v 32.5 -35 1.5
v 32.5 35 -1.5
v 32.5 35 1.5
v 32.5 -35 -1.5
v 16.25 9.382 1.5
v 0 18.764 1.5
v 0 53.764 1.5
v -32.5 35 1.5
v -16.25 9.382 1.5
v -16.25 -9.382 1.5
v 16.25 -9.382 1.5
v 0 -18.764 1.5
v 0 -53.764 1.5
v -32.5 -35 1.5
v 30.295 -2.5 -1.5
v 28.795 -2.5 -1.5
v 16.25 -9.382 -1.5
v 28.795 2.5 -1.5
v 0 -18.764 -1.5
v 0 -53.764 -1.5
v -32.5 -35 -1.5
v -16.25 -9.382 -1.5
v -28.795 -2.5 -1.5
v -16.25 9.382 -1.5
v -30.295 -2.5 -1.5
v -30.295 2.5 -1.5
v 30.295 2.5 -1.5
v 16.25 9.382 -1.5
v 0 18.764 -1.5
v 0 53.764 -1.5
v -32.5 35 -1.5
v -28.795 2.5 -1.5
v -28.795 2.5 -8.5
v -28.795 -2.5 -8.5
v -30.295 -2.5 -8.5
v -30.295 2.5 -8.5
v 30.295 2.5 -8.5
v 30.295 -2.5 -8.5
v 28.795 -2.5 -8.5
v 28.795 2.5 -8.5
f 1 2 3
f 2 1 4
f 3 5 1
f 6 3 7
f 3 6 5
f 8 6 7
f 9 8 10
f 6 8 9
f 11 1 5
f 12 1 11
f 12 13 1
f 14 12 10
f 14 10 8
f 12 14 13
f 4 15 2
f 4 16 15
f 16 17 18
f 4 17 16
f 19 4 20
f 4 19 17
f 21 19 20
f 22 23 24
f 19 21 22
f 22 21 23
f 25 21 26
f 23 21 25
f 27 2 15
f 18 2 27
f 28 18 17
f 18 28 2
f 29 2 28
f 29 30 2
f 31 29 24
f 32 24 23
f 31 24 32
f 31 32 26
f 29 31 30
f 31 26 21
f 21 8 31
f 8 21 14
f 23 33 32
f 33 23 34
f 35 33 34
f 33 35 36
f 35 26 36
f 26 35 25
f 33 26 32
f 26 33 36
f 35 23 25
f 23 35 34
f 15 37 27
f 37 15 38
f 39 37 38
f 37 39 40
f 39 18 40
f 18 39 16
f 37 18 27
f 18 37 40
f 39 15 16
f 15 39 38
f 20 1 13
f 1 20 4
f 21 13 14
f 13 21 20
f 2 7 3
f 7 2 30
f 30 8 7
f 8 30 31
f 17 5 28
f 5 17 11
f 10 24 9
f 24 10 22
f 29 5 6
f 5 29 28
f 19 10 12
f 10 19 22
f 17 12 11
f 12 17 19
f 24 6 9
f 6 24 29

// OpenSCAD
$fn = 100;

// Functions for calculating the half-hexagons
function edge_length(width) = (width/2) / cos(30); // CAH
function point_height(width) = (width/2) * tan(30); // TOA
function leg(width) = edge_length(width) * sqrt(1/2);
function x_offset(width) = (width/2) - leg(width) * cos(15);
function y_offset(width, length) = length/2 - (leg(width) * sin(15));

// Core size variables
scaling = 1;
lip = 0;
h = (35 + lip) * scaling;
w = 65 * scaling;
l = 70 * scaling;

// Values for interior space
h_pad = -1;
w_pad = 5;
l_pad = 5;


// The lid
h_lid = 3;
function hex_len(width) = 2 * (cos(30) * width);
hex_edge = edge_length(w/2);

translate([0,0,0]){
difference(){
union(){
cube([w, l, h_lid], center=true); // Center Cube
translate([-w/2.2,0,-h_lid*1.5]){cube([1.5, 5, 8], center=true);} // The teeth
translate([w/2.2,0,-h_lid*1.5]){cube([1.5, 5, 8], center=true);}
translate([x_offset(w),-y_offset(w,l),0]){
	rotate([0,0,30]) cube([edge_length(w),edge_length(w),h_lid], center=true);
}
translate([-x_offset(w),-y_offset(w,l),0]){
	rotate([0,0,-30]) cube([edge_length(w),edge_length(w),h_lid], center=true);
}

translate([x_offset(w),y_offset(w,l),0]){
	rotate([0,0,-30]) cube([edge_length(w),edge_length(w),h_lid], center=true);
}
translate([-x_offset(w),y_offset(w,l),0]){
	rotate([0,0,30]) cube([edge_length(w),edge_length(w),h_lid], center=true);
}}

// The cutout
translate([0,0,0]){
union(){
	rotate([0,0,0]) cube([hex_len(hex_edge),hex_edge,h_lid], center=true);
	rotate([0,0,60]) cube([hex_len(hex_edge),hex_edge,h_lid], center=true);
	rotate([0,0,120]) cube([hex_len(hex_edge),hex_edge,h_lid], center=true);
}}}}
